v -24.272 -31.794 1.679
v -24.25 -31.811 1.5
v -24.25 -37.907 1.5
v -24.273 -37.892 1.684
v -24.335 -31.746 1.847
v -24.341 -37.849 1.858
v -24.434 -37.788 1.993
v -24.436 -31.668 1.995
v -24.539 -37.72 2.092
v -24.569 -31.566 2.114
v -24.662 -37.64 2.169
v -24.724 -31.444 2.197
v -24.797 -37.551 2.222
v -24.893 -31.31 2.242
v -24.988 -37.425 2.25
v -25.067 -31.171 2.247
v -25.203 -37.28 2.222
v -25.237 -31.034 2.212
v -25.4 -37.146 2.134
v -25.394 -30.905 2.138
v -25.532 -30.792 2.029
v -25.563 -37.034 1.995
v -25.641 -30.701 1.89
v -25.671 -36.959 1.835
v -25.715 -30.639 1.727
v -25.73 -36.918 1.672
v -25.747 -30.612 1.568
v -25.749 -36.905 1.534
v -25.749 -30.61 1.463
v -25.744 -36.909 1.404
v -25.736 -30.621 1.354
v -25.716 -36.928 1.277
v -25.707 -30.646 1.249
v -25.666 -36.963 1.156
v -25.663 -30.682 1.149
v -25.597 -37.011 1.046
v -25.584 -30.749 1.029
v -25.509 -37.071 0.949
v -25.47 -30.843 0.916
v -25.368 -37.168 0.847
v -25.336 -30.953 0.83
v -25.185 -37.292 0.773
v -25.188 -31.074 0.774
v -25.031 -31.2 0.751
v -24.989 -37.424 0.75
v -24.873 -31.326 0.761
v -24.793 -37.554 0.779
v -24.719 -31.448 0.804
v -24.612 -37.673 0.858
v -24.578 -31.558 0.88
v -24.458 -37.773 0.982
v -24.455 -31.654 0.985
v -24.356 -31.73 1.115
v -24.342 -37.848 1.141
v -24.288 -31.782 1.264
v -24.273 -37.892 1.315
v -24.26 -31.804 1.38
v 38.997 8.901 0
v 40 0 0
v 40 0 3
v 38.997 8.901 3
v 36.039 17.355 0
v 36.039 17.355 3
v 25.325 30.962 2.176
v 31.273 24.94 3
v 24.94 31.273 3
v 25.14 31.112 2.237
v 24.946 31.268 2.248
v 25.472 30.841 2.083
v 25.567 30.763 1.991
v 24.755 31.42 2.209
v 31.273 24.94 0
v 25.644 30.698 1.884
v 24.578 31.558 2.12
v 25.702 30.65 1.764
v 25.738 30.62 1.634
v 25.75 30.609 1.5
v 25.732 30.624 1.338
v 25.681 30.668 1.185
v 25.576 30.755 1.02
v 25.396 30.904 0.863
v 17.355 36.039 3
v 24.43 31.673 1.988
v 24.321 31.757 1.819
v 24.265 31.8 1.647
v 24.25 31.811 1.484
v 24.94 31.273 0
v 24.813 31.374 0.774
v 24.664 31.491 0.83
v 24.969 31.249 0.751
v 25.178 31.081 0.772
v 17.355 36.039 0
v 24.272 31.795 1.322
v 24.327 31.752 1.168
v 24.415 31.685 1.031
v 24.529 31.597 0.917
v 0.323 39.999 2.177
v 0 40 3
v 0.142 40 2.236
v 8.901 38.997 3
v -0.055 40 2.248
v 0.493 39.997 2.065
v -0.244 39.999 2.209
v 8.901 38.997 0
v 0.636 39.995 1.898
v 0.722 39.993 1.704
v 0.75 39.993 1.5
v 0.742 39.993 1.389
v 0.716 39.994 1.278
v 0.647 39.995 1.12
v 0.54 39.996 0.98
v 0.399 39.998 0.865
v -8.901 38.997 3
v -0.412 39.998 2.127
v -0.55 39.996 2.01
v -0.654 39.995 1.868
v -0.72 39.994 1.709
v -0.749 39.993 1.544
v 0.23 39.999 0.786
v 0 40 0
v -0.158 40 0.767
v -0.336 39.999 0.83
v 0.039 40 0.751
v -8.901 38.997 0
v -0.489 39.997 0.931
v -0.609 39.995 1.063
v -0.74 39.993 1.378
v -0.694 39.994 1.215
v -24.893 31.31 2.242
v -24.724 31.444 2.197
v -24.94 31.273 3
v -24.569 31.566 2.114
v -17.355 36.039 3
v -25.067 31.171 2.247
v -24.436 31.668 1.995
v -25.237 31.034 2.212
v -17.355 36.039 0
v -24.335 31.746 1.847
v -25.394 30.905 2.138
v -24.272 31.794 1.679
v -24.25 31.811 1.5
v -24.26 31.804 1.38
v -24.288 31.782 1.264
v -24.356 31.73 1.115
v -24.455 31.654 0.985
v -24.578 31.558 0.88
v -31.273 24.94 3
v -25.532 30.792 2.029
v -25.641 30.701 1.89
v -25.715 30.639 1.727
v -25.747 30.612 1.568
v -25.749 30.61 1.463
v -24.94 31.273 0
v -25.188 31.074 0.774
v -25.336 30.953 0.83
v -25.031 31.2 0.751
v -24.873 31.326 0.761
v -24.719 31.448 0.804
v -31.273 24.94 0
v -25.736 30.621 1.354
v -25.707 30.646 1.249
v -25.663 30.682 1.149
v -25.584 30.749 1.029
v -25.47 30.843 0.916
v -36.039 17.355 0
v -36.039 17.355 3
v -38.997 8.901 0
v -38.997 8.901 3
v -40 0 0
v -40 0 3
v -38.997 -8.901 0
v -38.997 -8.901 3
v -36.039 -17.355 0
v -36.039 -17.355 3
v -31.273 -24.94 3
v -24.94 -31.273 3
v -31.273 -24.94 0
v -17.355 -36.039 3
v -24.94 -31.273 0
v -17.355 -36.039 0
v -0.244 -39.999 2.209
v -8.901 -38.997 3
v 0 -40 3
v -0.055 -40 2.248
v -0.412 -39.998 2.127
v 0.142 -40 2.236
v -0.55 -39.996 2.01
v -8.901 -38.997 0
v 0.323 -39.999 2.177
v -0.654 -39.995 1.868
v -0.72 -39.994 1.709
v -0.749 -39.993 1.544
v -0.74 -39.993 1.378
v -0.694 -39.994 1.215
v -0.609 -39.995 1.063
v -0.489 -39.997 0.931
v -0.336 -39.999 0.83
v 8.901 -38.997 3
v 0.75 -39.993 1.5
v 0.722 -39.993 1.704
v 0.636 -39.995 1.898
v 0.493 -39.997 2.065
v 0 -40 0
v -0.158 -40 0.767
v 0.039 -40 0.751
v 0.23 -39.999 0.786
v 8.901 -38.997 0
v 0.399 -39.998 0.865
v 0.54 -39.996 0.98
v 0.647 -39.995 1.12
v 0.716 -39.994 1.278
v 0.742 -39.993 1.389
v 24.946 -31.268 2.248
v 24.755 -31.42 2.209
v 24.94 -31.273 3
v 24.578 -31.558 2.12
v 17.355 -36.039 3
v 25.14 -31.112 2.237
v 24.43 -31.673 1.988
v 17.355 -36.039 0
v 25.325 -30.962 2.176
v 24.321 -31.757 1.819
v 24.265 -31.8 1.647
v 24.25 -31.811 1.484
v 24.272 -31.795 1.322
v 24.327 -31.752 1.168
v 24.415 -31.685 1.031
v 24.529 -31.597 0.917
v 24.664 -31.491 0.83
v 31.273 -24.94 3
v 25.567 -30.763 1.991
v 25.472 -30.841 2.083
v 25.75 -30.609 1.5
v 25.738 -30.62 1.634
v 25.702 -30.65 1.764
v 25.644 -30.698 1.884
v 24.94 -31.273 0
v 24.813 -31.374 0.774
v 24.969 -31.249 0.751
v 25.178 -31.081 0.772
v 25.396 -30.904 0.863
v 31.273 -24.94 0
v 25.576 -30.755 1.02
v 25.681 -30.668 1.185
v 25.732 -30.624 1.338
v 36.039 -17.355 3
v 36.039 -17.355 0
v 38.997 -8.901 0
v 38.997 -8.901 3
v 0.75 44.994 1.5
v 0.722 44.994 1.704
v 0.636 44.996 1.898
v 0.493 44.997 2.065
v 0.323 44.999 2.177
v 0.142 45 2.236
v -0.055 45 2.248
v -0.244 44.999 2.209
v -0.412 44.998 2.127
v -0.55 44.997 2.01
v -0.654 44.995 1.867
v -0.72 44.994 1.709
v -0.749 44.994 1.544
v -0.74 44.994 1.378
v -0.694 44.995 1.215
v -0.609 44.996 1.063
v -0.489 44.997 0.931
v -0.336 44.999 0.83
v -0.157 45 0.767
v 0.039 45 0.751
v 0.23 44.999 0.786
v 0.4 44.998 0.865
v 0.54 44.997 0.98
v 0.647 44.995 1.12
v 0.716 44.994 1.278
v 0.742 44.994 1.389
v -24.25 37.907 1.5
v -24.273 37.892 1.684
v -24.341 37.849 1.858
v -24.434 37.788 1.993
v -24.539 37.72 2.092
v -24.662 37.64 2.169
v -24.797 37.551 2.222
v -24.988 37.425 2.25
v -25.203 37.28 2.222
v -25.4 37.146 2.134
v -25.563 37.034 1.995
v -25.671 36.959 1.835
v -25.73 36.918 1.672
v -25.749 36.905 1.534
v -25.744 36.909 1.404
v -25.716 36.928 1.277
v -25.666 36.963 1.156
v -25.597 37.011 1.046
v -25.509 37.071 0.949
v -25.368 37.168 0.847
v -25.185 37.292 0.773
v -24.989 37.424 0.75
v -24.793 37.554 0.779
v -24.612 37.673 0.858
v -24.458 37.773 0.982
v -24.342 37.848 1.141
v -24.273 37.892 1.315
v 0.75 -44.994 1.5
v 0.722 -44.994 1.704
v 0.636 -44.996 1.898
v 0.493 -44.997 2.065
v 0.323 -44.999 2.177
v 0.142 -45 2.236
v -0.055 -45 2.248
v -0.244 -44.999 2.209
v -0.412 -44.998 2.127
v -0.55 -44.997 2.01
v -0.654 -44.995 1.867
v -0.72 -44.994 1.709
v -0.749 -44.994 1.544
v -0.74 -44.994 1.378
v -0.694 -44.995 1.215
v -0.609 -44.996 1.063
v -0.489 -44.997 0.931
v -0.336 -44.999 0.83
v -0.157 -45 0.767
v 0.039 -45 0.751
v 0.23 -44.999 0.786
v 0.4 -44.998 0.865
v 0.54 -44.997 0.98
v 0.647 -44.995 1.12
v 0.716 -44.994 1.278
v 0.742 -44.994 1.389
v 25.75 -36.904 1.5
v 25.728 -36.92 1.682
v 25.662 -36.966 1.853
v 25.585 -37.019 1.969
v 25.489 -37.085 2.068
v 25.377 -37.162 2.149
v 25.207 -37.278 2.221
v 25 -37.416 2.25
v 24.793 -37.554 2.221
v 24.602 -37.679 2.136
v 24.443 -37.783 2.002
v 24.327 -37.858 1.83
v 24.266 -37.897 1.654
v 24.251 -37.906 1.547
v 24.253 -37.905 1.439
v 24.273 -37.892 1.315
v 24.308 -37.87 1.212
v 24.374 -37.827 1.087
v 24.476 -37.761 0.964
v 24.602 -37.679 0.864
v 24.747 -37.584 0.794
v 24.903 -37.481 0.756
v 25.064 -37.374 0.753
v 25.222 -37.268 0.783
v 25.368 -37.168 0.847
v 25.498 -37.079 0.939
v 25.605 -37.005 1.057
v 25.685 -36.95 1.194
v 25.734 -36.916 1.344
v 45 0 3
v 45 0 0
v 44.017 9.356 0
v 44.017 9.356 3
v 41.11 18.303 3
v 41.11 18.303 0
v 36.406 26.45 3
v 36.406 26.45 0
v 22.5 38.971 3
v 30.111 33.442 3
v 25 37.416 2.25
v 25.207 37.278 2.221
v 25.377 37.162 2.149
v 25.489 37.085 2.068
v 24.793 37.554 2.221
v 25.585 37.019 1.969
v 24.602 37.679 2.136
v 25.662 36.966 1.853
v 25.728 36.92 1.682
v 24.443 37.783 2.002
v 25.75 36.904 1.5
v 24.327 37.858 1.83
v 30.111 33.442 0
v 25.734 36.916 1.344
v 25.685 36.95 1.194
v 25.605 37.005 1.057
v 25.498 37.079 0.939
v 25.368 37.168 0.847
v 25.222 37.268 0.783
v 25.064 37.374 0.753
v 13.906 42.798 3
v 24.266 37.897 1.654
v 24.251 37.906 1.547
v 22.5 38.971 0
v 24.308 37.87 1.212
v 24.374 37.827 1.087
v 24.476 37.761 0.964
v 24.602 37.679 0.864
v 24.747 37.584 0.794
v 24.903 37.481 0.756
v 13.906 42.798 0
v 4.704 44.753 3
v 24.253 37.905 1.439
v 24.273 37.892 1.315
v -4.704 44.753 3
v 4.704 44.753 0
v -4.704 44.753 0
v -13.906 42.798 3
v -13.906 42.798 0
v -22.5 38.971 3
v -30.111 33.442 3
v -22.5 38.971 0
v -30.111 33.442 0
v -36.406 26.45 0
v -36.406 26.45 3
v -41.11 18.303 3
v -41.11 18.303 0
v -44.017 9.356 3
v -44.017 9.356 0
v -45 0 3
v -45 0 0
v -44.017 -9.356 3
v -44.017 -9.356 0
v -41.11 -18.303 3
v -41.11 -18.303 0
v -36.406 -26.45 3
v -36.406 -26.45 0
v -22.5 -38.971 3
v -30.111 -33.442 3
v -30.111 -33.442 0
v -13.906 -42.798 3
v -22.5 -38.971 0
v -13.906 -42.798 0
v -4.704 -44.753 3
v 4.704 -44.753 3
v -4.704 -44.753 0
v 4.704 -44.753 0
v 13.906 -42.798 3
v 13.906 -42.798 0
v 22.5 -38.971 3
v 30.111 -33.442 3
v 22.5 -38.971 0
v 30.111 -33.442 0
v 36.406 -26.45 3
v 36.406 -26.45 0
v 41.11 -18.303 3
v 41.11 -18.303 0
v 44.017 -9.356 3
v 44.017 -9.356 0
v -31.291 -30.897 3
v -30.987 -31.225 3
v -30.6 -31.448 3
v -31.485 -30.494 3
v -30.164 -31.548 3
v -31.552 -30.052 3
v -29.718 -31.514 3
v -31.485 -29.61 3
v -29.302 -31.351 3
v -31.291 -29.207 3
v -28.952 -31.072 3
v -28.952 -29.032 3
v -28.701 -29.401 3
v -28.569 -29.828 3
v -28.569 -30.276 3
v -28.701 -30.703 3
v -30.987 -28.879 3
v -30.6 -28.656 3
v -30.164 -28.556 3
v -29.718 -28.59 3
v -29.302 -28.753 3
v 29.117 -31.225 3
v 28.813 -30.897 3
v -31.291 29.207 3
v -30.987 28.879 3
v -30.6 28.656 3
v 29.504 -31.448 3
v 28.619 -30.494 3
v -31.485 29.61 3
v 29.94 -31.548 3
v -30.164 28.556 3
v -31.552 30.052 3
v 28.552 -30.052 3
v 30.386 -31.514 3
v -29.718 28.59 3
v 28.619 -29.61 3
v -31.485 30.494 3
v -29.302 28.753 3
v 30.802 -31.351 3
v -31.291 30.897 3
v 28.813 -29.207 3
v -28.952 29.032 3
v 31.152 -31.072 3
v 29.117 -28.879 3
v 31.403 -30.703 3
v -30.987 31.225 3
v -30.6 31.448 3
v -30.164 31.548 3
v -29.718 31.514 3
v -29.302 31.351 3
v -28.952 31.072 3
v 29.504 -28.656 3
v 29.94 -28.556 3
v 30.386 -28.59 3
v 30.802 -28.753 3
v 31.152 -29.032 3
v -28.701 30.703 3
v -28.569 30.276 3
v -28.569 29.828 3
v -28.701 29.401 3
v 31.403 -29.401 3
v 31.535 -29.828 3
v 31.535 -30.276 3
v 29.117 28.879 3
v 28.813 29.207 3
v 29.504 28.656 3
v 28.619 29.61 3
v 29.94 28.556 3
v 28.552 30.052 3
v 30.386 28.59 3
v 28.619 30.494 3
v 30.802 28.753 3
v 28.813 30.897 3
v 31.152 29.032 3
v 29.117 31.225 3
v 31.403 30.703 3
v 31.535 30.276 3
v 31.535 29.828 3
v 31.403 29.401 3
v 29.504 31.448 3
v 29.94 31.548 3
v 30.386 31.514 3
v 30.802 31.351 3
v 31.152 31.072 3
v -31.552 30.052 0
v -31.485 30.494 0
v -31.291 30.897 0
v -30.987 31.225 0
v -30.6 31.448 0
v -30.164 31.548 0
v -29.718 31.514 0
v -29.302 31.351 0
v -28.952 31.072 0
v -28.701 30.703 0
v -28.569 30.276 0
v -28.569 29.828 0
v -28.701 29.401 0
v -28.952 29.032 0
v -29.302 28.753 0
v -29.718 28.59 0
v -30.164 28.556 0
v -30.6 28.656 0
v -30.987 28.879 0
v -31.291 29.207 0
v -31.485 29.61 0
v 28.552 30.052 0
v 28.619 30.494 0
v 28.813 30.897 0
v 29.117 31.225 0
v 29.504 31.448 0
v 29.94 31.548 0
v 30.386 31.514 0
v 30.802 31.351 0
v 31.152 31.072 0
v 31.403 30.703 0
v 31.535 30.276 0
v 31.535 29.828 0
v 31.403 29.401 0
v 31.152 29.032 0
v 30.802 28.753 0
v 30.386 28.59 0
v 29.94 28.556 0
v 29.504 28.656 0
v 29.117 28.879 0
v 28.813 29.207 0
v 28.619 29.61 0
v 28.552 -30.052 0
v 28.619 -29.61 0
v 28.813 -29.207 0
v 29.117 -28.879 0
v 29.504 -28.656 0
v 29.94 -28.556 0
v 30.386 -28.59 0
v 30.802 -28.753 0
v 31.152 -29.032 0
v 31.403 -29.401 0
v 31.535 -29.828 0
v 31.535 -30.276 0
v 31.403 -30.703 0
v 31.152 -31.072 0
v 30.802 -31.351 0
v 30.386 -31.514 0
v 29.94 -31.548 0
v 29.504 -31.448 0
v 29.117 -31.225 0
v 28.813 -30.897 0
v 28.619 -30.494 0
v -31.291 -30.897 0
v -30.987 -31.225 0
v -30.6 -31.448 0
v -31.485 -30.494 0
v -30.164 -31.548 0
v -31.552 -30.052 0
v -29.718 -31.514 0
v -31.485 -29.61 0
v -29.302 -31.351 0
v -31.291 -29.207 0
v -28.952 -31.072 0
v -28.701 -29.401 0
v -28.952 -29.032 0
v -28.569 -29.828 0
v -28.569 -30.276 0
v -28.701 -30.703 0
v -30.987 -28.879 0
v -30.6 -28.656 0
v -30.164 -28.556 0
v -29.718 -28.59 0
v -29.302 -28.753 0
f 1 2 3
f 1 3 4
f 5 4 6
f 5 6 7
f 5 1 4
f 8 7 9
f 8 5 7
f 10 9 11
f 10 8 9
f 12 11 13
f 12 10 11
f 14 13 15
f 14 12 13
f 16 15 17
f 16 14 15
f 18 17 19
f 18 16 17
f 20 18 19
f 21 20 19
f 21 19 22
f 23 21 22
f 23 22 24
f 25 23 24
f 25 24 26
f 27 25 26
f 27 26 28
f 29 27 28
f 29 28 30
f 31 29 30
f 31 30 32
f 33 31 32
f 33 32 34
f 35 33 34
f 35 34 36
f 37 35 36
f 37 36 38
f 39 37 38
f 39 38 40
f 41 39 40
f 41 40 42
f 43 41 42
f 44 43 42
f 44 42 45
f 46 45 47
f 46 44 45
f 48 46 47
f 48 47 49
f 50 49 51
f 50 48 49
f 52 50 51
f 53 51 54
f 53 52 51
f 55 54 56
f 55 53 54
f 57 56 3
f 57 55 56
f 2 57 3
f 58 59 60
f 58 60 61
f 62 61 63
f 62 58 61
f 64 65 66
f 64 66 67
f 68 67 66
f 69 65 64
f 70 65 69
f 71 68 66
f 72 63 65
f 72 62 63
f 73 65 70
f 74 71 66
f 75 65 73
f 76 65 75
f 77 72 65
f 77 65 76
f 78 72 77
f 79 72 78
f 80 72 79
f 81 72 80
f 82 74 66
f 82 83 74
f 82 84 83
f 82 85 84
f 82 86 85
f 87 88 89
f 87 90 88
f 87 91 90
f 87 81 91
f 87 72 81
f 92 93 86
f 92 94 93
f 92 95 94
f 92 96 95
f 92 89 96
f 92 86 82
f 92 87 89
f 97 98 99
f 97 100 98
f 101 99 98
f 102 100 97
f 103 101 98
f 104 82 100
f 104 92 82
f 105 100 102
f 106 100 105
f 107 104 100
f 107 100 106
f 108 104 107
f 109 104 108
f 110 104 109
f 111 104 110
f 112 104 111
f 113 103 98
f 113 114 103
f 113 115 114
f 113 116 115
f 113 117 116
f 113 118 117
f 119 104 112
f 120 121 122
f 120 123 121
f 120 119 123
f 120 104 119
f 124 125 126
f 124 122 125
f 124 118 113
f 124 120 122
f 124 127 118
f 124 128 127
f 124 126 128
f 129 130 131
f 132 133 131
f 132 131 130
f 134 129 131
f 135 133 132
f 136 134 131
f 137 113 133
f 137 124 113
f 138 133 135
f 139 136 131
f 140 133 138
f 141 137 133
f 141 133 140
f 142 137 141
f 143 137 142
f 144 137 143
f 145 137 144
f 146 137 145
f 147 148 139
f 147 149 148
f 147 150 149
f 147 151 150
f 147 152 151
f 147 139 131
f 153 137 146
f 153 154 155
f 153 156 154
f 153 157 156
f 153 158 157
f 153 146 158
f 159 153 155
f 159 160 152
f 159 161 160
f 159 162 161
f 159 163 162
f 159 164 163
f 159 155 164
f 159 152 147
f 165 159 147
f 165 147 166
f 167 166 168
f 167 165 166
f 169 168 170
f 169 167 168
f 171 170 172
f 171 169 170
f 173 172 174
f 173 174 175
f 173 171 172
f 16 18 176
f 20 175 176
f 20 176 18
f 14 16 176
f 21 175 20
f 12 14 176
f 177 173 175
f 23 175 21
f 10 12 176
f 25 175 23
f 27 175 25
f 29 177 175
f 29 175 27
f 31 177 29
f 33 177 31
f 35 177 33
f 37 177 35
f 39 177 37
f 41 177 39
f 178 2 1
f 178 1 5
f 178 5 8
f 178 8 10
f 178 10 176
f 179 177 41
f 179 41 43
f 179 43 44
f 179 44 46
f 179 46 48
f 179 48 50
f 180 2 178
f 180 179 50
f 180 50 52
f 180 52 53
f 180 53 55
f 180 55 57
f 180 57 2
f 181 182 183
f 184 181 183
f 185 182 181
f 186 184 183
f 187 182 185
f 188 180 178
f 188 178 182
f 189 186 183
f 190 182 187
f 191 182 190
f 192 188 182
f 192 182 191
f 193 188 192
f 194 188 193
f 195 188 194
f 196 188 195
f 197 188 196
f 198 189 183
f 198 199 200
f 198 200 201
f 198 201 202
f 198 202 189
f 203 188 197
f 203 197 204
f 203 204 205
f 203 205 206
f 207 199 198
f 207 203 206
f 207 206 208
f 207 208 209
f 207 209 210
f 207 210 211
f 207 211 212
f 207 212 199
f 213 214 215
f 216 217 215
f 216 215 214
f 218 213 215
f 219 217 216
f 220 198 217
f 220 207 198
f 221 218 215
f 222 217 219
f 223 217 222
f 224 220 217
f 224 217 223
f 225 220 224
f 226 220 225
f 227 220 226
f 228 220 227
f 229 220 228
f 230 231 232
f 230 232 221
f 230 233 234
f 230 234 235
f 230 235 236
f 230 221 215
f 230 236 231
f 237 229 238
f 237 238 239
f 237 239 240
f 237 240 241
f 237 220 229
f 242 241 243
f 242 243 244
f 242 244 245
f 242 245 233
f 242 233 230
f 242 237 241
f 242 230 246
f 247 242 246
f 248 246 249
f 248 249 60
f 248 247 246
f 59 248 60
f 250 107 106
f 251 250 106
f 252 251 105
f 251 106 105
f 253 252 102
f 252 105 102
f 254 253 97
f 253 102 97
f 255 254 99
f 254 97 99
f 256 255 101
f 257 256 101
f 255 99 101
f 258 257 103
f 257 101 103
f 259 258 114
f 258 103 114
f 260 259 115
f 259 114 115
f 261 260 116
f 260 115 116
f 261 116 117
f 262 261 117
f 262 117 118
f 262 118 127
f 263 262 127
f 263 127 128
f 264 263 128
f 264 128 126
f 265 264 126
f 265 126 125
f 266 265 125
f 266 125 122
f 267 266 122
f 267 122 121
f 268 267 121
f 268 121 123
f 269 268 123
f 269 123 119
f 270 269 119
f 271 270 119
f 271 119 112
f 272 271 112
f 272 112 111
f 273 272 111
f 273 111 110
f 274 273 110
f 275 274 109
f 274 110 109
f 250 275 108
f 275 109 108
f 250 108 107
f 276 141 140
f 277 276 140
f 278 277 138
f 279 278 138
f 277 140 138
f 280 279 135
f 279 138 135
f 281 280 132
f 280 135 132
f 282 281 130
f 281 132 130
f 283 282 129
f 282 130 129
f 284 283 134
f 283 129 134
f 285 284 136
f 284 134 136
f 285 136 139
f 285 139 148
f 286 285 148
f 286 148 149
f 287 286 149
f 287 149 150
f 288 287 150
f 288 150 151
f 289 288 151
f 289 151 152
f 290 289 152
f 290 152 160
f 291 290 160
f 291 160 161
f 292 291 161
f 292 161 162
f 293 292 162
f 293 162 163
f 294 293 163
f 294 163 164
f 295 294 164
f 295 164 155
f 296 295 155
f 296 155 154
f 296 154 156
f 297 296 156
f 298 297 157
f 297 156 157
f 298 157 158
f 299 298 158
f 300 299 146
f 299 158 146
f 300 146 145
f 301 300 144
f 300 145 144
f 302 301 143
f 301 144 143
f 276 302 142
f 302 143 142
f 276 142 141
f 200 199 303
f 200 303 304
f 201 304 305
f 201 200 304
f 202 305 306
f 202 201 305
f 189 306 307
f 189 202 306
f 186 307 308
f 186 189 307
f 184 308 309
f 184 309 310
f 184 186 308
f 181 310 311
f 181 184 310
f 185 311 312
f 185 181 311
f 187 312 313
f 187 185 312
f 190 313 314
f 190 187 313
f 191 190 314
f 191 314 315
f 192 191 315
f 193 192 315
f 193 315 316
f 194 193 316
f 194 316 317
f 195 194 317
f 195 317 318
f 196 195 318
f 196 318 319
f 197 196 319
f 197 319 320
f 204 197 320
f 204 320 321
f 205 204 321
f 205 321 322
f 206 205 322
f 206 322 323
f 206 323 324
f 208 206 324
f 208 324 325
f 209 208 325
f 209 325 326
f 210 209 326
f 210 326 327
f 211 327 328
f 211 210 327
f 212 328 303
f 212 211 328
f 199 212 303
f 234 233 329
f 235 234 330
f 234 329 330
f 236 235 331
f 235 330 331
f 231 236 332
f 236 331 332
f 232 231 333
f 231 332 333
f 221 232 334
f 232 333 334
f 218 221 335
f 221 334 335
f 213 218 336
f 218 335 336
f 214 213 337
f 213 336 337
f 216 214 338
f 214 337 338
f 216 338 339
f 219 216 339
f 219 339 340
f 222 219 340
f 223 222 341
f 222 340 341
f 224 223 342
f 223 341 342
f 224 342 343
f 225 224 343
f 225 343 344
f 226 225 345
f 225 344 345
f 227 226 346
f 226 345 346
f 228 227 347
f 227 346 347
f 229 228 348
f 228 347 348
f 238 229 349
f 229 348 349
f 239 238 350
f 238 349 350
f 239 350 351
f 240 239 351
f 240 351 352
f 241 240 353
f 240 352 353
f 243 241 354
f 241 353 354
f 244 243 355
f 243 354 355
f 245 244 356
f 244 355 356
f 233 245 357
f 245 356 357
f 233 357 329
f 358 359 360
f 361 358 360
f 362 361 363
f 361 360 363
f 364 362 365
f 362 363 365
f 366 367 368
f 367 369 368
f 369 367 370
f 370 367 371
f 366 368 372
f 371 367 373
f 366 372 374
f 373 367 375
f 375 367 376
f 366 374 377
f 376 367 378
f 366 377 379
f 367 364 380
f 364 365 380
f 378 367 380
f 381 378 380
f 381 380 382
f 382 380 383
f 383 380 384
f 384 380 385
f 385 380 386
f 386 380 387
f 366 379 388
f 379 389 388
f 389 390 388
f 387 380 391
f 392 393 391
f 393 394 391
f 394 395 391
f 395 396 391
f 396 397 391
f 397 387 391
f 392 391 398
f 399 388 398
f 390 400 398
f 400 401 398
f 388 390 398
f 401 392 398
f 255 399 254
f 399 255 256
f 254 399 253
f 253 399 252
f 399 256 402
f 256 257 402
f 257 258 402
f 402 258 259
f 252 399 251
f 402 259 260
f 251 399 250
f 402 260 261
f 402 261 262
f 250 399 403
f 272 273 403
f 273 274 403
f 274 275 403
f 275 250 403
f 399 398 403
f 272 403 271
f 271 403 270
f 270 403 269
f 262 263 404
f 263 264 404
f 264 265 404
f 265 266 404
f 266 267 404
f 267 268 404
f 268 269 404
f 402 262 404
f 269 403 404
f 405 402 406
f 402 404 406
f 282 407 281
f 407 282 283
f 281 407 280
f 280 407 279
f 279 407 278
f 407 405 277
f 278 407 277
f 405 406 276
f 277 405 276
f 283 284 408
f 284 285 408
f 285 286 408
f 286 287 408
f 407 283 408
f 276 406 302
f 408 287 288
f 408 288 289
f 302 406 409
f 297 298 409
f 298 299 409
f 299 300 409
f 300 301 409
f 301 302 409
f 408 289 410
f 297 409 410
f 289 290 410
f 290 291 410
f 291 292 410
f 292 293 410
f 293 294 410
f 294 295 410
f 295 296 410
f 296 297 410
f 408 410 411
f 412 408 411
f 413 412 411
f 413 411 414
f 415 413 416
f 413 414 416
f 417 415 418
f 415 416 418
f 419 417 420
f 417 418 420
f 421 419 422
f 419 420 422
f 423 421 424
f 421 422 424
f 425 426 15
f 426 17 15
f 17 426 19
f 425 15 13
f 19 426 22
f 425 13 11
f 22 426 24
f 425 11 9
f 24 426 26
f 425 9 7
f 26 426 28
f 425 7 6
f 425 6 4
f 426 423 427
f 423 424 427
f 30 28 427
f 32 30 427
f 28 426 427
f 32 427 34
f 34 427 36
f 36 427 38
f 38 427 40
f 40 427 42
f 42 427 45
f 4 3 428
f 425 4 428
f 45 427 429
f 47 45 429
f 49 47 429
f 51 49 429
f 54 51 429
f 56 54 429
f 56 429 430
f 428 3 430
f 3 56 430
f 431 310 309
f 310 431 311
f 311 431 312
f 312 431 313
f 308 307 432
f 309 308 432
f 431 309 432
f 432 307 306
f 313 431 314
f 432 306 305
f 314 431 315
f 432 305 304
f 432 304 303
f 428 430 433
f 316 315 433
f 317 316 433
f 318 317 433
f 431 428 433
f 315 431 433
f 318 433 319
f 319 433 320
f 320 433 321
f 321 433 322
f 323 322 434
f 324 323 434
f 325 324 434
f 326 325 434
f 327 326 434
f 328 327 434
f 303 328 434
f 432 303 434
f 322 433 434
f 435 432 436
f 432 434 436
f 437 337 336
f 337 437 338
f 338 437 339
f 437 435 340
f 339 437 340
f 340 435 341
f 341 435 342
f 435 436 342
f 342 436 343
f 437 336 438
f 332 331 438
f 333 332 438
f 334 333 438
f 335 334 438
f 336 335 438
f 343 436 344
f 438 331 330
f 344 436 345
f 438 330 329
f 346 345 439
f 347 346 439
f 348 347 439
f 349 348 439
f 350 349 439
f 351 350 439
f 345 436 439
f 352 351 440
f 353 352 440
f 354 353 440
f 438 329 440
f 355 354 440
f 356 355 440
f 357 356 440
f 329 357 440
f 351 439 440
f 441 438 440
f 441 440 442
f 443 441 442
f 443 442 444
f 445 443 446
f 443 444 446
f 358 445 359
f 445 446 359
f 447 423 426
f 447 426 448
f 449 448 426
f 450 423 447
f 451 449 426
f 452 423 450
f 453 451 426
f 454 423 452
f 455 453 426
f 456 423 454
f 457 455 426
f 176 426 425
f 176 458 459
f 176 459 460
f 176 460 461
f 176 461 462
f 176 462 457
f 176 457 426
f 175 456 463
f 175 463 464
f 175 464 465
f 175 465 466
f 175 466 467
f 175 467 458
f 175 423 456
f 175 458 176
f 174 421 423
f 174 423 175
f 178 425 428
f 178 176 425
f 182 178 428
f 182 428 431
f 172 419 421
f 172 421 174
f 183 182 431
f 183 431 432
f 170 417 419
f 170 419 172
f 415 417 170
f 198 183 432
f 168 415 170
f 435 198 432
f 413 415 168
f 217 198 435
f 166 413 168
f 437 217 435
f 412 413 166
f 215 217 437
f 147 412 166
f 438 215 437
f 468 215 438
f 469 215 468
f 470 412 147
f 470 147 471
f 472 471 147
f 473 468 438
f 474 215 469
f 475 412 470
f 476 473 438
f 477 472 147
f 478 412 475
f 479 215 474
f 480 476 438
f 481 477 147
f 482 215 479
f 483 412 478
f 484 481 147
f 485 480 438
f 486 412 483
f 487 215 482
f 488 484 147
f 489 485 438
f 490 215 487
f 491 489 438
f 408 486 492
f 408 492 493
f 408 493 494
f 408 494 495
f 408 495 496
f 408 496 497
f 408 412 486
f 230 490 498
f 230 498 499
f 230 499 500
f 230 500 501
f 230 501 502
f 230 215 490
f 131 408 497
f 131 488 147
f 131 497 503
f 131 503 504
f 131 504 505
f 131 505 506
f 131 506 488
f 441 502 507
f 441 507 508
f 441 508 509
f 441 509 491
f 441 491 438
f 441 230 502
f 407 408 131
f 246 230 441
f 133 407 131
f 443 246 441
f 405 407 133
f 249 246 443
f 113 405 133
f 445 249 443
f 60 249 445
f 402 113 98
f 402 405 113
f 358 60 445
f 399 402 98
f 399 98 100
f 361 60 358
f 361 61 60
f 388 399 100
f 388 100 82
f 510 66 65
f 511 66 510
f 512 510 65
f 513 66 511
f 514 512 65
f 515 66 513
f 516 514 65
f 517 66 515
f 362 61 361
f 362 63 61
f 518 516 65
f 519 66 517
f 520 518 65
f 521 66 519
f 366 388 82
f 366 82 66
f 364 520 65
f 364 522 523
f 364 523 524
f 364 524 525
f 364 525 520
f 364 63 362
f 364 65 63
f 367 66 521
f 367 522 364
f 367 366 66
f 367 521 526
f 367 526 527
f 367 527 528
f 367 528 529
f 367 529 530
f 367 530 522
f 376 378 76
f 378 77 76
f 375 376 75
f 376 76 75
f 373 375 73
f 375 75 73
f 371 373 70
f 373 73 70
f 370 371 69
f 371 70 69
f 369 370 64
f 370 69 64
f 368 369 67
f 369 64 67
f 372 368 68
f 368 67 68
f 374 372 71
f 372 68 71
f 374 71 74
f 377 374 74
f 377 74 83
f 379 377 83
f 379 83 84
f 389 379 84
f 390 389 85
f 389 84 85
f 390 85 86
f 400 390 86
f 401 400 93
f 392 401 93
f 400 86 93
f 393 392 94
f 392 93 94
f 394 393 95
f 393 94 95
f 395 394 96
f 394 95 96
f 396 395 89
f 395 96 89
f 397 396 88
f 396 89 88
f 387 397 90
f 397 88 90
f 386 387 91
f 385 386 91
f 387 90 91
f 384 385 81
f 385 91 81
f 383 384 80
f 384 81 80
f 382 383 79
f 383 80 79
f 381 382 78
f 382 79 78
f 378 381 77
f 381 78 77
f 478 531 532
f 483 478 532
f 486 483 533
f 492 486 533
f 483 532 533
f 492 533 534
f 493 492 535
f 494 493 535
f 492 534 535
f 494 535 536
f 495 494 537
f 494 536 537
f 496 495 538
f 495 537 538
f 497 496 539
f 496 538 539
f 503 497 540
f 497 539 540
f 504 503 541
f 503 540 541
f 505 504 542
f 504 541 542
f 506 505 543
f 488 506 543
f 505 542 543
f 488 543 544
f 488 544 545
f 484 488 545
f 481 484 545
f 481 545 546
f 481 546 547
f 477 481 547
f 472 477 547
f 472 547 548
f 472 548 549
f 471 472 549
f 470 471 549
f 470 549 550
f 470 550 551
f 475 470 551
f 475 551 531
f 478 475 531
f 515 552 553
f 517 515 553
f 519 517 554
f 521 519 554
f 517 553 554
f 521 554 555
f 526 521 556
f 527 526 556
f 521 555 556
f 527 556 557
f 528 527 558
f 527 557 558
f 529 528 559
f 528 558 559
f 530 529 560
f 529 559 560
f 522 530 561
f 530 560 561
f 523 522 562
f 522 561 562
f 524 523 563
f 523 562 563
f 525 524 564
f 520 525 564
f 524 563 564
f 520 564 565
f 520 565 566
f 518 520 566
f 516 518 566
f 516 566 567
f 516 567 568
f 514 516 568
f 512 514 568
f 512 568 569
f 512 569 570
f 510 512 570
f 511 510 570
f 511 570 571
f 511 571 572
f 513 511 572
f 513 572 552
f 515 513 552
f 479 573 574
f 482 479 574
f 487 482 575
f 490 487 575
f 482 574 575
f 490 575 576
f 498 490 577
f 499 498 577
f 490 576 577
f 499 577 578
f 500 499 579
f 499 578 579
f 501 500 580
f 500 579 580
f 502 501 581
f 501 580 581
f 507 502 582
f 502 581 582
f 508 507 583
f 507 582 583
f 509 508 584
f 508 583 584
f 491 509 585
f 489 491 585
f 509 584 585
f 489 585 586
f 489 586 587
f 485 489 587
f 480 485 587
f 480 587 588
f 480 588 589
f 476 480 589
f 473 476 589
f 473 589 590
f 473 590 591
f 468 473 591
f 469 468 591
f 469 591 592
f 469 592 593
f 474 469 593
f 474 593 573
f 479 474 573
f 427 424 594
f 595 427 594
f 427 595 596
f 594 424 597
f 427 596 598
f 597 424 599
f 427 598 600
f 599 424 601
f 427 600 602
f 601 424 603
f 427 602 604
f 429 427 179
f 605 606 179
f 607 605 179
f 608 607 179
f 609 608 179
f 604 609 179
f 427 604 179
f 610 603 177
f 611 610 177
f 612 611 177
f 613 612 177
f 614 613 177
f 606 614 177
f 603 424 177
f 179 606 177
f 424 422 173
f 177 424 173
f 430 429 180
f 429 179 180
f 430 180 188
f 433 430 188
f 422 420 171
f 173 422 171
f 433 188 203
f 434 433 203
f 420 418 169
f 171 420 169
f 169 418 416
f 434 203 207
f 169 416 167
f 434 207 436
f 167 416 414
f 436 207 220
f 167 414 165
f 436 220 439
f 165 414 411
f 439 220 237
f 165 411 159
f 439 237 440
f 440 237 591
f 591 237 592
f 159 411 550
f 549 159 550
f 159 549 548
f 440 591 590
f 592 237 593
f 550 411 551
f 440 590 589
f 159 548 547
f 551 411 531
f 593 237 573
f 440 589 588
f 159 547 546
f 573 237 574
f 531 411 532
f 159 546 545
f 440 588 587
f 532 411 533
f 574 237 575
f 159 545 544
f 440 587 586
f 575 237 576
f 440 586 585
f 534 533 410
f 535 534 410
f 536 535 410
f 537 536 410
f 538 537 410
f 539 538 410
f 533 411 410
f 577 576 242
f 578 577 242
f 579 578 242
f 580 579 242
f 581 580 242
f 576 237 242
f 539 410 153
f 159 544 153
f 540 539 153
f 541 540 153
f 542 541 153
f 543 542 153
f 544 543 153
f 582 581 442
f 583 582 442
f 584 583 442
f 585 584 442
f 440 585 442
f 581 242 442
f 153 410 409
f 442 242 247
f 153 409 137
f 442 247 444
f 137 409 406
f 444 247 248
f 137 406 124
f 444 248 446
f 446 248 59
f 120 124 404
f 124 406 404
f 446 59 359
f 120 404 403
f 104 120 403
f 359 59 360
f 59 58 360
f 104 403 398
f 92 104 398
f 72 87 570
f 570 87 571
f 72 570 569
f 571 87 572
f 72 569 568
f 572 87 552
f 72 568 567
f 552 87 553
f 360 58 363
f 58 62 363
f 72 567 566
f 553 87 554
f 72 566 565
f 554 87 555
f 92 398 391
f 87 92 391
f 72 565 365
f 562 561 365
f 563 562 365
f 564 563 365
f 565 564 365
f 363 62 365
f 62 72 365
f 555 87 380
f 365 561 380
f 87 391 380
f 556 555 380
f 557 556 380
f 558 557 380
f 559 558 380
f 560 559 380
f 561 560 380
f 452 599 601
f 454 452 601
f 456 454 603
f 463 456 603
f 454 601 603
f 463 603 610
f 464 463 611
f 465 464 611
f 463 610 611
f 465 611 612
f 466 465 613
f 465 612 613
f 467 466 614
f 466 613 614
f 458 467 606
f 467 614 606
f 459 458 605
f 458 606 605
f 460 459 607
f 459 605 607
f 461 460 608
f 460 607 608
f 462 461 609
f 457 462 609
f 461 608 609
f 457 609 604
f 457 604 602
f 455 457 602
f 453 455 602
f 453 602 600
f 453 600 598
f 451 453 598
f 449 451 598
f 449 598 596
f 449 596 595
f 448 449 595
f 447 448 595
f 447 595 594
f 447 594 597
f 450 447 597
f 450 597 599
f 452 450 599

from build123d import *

# Parameters (mm, degrees)
F0_R     = 45
F0_R_2   = 40
F2_DEPTH = 3
F5_D     = 3
F6_R     = 0.75
F7_DEPTH = 50


with BuildPart() as f2:
    # F0 (on Top) → F2 (new body)
    with BuildSketch(Plane.XY):
        Circle(F0_R)
        Circle(F0_R_2, mode=Mode.SUBTRACT)
    extrude(amount=F2_DEPTH)

    # F5 (through all)
    with Locations(Plane.XY.offset(3)):
        with Locations((-30.052038, 30.052038), (-30.052038, -30.052038), (30.052038, -30.052038), (30.052038, 30.052038)):
            Hole(F5_D / 2)

    # F6 (on Front) → F7 (cut, symmetric)
    with BuildSketch(Plane.XZ):
        with Locations((-25, 1.5)):
            Circle(F6_R)
        with Locations((0, 1.5)):
            Circle(F6_R)
        with Locations((25, 1.5)):
            Circle(F6_R)
    extrude(amount=F7_DEPTH, both=True, mode=Mode.SUBTRACT)


solid = f2.part
